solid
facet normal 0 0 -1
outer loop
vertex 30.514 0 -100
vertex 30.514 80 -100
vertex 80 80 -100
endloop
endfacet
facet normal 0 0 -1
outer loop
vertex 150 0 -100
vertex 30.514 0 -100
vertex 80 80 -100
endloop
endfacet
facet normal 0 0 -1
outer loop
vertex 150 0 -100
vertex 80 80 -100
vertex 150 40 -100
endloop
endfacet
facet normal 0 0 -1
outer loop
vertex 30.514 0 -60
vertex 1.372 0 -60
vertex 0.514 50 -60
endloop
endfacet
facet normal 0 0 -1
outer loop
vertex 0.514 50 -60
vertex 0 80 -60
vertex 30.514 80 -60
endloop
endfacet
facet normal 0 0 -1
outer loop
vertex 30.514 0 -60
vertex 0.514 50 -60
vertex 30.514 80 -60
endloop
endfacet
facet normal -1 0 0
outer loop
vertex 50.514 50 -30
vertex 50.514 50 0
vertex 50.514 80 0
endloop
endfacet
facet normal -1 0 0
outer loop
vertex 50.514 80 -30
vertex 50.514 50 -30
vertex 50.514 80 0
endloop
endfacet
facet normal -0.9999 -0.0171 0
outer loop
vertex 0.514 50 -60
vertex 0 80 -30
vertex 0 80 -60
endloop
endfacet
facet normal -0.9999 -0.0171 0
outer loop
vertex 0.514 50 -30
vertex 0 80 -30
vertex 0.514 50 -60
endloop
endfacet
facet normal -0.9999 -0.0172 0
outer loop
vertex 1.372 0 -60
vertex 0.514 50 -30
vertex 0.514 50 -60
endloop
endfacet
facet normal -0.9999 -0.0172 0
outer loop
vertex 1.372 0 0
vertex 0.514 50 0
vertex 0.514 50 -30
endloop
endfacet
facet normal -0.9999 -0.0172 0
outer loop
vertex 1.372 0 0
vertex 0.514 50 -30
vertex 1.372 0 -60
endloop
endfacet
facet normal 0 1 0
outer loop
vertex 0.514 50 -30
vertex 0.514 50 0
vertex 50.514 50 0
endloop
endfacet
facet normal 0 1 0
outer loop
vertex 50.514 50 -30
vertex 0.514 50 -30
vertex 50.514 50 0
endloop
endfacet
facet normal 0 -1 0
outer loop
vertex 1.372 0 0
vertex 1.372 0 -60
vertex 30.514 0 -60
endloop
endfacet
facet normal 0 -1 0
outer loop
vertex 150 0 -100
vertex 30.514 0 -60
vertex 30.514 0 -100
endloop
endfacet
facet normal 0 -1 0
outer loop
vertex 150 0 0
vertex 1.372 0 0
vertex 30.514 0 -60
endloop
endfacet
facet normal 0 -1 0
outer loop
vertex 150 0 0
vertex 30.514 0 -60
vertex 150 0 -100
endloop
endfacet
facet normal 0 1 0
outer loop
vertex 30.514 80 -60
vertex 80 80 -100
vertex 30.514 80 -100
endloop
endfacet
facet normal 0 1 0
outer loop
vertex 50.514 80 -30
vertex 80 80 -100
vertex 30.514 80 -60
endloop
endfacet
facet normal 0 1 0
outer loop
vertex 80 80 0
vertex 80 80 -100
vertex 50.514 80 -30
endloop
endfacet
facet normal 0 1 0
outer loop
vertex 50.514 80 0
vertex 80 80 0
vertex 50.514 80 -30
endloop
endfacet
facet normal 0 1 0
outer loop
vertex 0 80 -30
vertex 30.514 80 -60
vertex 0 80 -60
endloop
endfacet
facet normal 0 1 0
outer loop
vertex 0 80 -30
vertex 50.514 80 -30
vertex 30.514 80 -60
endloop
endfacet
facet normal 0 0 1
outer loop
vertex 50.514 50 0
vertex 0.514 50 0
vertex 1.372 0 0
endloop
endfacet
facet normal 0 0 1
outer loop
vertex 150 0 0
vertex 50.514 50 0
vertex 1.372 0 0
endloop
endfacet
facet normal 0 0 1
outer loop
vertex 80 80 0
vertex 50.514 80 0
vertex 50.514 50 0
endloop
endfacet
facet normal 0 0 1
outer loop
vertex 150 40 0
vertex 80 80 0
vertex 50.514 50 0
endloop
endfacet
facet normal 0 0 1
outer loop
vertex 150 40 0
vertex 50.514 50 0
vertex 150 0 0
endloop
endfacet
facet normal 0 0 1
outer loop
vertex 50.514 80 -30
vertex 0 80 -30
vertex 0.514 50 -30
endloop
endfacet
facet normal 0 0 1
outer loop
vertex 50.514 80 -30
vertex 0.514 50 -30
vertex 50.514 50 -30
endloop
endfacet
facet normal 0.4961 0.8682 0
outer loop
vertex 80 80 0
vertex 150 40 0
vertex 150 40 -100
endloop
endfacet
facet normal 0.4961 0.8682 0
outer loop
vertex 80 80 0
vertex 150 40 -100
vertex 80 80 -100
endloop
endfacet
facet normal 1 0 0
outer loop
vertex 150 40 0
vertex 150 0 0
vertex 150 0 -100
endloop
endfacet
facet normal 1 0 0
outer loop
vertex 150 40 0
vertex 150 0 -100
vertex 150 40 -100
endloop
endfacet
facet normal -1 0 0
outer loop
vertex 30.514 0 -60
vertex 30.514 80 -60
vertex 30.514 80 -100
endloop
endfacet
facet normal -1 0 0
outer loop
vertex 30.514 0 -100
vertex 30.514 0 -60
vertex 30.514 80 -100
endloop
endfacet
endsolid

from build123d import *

# Parameters (mm, degrees)
BOSS_EXTRUDE1_DEPTH = 100
CUT_EXTRUDE1_DEPTH  = 30
CUT_EXTRUDE2_DEPTH  = 40
SKETCH5_W           = 30
SKETCH5_H           = 40
CUT_EXTRUDE3_DEPTH  = 188.082869339


with BuildPart() as part:
    # Sketch1 → Boss-Extrude1 (new body)
    with BuildSketch(Plane.XY):
        Polygon((1.371761587, 0), (150, 0), (150, 40), (80, 80), (0, 80), align=None)
    extrude(amount=-BOSS_EXTRUDE1_DEPTH)

    # Sketch2 → Cut-Extrude1 (cut)
    with BuildSketch(Plane.XY):
        Polygon((0, 80), (0.514410595, 50), (50.514410595, 50), (50.514410595, 80), align=None)
    extrude(amount=-CUT_EXTRUDE1_DEPTH, mode=Mode.SUBTRACT)

    # Sketch3 → Cut-Extrude2 (cut)
    with BuildSketch(Plane(origin=(0, 0, -100), x_dir=(-1, 0, 0), z_dir=(0, 0, -1))):
        Polygon((0, 80), (-30.514410595, 80), (-30.514410595, 50), (-0.514410595, 50), align=None)
    extrude(amount=-CUT_EXTRUDE2_DEPTH, mode=Mode.SUBTRACT)

    # Sketch5 → Cut-Extrude3 (cut, through all)
    with BuildSketch(Plane(origin=(0, 50, 0), x_dir=(1, 0, 0), z_dir=(0, 1, 0))):
        with Locations((15.514410595, 80)):
            Rectangle(SKETCH5_W, SKETCH5_H)
    extrude(amount=-CUT_EXTRUDE3_DEPTH, mode=Mode.SUBTRACT)


solid = part.part
